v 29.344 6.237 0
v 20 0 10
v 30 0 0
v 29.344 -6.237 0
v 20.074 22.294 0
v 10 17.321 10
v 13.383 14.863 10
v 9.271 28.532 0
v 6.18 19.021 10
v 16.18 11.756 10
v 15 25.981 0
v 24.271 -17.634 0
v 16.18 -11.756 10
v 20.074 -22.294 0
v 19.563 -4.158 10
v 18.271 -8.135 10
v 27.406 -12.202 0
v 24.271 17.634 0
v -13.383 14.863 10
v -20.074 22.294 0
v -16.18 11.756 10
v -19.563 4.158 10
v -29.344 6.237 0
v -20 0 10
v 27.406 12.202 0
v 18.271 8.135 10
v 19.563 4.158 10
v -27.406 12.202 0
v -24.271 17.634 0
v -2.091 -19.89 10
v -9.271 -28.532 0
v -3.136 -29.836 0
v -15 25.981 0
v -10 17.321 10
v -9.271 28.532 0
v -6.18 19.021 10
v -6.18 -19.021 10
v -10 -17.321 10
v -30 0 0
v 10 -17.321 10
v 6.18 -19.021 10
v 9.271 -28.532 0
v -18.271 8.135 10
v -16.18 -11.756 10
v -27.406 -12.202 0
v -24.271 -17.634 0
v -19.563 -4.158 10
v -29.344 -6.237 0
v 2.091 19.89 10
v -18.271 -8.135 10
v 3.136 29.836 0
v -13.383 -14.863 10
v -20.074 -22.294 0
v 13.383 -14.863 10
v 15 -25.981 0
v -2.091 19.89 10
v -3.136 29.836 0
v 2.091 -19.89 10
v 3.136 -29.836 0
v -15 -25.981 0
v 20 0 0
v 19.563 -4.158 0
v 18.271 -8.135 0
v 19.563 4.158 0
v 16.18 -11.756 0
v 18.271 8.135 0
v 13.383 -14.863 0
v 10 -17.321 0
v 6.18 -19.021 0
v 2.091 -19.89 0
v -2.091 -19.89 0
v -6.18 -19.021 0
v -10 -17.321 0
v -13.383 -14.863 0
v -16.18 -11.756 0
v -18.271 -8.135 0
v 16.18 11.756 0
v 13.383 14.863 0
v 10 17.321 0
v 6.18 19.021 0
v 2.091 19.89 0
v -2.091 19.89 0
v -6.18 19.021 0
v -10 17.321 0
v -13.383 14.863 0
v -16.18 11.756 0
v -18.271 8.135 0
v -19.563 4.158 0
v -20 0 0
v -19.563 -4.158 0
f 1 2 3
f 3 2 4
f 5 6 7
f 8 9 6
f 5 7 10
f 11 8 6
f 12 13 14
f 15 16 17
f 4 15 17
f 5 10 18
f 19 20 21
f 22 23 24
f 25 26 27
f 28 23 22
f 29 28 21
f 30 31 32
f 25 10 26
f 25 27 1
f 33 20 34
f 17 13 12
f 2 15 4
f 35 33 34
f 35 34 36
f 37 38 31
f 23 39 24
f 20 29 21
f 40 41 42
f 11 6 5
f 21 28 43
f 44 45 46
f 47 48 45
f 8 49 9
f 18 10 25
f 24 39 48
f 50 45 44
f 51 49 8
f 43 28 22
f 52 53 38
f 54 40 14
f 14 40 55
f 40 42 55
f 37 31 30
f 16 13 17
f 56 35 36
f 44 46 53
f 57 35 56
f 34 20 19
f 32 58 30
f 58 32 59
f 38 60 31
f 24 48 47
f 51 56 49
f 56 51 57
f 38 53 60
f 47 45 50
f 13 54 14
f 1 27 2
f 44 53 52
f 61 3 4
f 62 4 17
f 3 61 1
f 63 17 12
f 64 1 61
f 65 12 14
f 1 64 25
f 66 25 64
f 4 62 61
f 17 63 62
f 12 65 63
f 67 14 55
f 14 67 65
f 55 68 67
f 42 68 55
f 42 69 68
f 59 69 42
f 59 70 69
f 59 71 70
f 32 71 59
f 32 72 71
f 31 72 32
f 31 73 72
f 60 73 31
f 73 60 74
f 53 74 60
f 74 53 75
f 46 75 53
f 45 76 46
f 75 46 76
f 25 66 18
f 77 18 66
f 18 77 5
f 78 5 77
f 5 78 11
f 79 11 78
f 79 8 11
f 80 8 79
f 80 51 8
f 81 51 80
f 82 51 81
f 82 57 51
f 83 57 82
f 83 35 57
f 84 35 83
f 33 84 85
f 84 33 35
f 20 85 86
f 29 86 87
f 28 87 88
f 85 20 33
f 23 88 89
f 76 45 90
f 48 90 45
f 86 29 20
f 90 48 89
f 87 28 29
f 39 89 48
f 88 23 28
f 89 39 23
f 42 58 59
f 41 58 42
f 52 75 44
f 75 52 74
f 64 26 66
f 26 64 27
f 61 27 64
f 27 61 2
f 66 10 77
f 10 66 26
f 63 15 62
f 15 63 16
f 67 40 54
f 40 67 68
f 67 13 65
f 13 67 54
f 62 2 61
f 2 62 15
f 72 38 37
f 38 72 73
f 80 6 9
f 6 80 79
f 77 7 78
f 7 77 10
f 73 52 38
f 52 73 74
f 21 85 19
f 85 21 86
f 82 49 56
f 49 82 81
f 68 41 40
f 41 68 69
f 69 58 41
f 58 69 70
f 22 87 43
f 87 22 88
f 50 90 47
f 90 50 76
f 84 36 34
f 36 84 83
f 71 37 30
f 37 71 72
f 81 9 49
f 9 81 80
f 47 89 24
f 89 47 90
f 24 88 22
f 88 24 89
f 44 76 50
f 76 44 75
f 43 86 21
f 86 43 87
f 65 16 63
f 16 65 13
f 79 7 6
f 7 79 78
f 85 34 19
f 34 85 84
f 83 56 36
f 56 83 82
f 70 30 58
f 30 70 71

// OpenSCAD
module bevel_tube(bottomRadius, topRadius, height) {
	difference() {
		cylinder(r1 = bottomRadius, r2 = topRadius, h = height);

		translate([0, 0, -5]) {
			if (topRadius > bottomRadius) {
				cylinder(r = bottomRadius, h = height + 10);
			} else {
				cylinder(r = topRadius, h = height + 10);
			}
		}
	}
}

bevel_tube(30, 20, 10);
